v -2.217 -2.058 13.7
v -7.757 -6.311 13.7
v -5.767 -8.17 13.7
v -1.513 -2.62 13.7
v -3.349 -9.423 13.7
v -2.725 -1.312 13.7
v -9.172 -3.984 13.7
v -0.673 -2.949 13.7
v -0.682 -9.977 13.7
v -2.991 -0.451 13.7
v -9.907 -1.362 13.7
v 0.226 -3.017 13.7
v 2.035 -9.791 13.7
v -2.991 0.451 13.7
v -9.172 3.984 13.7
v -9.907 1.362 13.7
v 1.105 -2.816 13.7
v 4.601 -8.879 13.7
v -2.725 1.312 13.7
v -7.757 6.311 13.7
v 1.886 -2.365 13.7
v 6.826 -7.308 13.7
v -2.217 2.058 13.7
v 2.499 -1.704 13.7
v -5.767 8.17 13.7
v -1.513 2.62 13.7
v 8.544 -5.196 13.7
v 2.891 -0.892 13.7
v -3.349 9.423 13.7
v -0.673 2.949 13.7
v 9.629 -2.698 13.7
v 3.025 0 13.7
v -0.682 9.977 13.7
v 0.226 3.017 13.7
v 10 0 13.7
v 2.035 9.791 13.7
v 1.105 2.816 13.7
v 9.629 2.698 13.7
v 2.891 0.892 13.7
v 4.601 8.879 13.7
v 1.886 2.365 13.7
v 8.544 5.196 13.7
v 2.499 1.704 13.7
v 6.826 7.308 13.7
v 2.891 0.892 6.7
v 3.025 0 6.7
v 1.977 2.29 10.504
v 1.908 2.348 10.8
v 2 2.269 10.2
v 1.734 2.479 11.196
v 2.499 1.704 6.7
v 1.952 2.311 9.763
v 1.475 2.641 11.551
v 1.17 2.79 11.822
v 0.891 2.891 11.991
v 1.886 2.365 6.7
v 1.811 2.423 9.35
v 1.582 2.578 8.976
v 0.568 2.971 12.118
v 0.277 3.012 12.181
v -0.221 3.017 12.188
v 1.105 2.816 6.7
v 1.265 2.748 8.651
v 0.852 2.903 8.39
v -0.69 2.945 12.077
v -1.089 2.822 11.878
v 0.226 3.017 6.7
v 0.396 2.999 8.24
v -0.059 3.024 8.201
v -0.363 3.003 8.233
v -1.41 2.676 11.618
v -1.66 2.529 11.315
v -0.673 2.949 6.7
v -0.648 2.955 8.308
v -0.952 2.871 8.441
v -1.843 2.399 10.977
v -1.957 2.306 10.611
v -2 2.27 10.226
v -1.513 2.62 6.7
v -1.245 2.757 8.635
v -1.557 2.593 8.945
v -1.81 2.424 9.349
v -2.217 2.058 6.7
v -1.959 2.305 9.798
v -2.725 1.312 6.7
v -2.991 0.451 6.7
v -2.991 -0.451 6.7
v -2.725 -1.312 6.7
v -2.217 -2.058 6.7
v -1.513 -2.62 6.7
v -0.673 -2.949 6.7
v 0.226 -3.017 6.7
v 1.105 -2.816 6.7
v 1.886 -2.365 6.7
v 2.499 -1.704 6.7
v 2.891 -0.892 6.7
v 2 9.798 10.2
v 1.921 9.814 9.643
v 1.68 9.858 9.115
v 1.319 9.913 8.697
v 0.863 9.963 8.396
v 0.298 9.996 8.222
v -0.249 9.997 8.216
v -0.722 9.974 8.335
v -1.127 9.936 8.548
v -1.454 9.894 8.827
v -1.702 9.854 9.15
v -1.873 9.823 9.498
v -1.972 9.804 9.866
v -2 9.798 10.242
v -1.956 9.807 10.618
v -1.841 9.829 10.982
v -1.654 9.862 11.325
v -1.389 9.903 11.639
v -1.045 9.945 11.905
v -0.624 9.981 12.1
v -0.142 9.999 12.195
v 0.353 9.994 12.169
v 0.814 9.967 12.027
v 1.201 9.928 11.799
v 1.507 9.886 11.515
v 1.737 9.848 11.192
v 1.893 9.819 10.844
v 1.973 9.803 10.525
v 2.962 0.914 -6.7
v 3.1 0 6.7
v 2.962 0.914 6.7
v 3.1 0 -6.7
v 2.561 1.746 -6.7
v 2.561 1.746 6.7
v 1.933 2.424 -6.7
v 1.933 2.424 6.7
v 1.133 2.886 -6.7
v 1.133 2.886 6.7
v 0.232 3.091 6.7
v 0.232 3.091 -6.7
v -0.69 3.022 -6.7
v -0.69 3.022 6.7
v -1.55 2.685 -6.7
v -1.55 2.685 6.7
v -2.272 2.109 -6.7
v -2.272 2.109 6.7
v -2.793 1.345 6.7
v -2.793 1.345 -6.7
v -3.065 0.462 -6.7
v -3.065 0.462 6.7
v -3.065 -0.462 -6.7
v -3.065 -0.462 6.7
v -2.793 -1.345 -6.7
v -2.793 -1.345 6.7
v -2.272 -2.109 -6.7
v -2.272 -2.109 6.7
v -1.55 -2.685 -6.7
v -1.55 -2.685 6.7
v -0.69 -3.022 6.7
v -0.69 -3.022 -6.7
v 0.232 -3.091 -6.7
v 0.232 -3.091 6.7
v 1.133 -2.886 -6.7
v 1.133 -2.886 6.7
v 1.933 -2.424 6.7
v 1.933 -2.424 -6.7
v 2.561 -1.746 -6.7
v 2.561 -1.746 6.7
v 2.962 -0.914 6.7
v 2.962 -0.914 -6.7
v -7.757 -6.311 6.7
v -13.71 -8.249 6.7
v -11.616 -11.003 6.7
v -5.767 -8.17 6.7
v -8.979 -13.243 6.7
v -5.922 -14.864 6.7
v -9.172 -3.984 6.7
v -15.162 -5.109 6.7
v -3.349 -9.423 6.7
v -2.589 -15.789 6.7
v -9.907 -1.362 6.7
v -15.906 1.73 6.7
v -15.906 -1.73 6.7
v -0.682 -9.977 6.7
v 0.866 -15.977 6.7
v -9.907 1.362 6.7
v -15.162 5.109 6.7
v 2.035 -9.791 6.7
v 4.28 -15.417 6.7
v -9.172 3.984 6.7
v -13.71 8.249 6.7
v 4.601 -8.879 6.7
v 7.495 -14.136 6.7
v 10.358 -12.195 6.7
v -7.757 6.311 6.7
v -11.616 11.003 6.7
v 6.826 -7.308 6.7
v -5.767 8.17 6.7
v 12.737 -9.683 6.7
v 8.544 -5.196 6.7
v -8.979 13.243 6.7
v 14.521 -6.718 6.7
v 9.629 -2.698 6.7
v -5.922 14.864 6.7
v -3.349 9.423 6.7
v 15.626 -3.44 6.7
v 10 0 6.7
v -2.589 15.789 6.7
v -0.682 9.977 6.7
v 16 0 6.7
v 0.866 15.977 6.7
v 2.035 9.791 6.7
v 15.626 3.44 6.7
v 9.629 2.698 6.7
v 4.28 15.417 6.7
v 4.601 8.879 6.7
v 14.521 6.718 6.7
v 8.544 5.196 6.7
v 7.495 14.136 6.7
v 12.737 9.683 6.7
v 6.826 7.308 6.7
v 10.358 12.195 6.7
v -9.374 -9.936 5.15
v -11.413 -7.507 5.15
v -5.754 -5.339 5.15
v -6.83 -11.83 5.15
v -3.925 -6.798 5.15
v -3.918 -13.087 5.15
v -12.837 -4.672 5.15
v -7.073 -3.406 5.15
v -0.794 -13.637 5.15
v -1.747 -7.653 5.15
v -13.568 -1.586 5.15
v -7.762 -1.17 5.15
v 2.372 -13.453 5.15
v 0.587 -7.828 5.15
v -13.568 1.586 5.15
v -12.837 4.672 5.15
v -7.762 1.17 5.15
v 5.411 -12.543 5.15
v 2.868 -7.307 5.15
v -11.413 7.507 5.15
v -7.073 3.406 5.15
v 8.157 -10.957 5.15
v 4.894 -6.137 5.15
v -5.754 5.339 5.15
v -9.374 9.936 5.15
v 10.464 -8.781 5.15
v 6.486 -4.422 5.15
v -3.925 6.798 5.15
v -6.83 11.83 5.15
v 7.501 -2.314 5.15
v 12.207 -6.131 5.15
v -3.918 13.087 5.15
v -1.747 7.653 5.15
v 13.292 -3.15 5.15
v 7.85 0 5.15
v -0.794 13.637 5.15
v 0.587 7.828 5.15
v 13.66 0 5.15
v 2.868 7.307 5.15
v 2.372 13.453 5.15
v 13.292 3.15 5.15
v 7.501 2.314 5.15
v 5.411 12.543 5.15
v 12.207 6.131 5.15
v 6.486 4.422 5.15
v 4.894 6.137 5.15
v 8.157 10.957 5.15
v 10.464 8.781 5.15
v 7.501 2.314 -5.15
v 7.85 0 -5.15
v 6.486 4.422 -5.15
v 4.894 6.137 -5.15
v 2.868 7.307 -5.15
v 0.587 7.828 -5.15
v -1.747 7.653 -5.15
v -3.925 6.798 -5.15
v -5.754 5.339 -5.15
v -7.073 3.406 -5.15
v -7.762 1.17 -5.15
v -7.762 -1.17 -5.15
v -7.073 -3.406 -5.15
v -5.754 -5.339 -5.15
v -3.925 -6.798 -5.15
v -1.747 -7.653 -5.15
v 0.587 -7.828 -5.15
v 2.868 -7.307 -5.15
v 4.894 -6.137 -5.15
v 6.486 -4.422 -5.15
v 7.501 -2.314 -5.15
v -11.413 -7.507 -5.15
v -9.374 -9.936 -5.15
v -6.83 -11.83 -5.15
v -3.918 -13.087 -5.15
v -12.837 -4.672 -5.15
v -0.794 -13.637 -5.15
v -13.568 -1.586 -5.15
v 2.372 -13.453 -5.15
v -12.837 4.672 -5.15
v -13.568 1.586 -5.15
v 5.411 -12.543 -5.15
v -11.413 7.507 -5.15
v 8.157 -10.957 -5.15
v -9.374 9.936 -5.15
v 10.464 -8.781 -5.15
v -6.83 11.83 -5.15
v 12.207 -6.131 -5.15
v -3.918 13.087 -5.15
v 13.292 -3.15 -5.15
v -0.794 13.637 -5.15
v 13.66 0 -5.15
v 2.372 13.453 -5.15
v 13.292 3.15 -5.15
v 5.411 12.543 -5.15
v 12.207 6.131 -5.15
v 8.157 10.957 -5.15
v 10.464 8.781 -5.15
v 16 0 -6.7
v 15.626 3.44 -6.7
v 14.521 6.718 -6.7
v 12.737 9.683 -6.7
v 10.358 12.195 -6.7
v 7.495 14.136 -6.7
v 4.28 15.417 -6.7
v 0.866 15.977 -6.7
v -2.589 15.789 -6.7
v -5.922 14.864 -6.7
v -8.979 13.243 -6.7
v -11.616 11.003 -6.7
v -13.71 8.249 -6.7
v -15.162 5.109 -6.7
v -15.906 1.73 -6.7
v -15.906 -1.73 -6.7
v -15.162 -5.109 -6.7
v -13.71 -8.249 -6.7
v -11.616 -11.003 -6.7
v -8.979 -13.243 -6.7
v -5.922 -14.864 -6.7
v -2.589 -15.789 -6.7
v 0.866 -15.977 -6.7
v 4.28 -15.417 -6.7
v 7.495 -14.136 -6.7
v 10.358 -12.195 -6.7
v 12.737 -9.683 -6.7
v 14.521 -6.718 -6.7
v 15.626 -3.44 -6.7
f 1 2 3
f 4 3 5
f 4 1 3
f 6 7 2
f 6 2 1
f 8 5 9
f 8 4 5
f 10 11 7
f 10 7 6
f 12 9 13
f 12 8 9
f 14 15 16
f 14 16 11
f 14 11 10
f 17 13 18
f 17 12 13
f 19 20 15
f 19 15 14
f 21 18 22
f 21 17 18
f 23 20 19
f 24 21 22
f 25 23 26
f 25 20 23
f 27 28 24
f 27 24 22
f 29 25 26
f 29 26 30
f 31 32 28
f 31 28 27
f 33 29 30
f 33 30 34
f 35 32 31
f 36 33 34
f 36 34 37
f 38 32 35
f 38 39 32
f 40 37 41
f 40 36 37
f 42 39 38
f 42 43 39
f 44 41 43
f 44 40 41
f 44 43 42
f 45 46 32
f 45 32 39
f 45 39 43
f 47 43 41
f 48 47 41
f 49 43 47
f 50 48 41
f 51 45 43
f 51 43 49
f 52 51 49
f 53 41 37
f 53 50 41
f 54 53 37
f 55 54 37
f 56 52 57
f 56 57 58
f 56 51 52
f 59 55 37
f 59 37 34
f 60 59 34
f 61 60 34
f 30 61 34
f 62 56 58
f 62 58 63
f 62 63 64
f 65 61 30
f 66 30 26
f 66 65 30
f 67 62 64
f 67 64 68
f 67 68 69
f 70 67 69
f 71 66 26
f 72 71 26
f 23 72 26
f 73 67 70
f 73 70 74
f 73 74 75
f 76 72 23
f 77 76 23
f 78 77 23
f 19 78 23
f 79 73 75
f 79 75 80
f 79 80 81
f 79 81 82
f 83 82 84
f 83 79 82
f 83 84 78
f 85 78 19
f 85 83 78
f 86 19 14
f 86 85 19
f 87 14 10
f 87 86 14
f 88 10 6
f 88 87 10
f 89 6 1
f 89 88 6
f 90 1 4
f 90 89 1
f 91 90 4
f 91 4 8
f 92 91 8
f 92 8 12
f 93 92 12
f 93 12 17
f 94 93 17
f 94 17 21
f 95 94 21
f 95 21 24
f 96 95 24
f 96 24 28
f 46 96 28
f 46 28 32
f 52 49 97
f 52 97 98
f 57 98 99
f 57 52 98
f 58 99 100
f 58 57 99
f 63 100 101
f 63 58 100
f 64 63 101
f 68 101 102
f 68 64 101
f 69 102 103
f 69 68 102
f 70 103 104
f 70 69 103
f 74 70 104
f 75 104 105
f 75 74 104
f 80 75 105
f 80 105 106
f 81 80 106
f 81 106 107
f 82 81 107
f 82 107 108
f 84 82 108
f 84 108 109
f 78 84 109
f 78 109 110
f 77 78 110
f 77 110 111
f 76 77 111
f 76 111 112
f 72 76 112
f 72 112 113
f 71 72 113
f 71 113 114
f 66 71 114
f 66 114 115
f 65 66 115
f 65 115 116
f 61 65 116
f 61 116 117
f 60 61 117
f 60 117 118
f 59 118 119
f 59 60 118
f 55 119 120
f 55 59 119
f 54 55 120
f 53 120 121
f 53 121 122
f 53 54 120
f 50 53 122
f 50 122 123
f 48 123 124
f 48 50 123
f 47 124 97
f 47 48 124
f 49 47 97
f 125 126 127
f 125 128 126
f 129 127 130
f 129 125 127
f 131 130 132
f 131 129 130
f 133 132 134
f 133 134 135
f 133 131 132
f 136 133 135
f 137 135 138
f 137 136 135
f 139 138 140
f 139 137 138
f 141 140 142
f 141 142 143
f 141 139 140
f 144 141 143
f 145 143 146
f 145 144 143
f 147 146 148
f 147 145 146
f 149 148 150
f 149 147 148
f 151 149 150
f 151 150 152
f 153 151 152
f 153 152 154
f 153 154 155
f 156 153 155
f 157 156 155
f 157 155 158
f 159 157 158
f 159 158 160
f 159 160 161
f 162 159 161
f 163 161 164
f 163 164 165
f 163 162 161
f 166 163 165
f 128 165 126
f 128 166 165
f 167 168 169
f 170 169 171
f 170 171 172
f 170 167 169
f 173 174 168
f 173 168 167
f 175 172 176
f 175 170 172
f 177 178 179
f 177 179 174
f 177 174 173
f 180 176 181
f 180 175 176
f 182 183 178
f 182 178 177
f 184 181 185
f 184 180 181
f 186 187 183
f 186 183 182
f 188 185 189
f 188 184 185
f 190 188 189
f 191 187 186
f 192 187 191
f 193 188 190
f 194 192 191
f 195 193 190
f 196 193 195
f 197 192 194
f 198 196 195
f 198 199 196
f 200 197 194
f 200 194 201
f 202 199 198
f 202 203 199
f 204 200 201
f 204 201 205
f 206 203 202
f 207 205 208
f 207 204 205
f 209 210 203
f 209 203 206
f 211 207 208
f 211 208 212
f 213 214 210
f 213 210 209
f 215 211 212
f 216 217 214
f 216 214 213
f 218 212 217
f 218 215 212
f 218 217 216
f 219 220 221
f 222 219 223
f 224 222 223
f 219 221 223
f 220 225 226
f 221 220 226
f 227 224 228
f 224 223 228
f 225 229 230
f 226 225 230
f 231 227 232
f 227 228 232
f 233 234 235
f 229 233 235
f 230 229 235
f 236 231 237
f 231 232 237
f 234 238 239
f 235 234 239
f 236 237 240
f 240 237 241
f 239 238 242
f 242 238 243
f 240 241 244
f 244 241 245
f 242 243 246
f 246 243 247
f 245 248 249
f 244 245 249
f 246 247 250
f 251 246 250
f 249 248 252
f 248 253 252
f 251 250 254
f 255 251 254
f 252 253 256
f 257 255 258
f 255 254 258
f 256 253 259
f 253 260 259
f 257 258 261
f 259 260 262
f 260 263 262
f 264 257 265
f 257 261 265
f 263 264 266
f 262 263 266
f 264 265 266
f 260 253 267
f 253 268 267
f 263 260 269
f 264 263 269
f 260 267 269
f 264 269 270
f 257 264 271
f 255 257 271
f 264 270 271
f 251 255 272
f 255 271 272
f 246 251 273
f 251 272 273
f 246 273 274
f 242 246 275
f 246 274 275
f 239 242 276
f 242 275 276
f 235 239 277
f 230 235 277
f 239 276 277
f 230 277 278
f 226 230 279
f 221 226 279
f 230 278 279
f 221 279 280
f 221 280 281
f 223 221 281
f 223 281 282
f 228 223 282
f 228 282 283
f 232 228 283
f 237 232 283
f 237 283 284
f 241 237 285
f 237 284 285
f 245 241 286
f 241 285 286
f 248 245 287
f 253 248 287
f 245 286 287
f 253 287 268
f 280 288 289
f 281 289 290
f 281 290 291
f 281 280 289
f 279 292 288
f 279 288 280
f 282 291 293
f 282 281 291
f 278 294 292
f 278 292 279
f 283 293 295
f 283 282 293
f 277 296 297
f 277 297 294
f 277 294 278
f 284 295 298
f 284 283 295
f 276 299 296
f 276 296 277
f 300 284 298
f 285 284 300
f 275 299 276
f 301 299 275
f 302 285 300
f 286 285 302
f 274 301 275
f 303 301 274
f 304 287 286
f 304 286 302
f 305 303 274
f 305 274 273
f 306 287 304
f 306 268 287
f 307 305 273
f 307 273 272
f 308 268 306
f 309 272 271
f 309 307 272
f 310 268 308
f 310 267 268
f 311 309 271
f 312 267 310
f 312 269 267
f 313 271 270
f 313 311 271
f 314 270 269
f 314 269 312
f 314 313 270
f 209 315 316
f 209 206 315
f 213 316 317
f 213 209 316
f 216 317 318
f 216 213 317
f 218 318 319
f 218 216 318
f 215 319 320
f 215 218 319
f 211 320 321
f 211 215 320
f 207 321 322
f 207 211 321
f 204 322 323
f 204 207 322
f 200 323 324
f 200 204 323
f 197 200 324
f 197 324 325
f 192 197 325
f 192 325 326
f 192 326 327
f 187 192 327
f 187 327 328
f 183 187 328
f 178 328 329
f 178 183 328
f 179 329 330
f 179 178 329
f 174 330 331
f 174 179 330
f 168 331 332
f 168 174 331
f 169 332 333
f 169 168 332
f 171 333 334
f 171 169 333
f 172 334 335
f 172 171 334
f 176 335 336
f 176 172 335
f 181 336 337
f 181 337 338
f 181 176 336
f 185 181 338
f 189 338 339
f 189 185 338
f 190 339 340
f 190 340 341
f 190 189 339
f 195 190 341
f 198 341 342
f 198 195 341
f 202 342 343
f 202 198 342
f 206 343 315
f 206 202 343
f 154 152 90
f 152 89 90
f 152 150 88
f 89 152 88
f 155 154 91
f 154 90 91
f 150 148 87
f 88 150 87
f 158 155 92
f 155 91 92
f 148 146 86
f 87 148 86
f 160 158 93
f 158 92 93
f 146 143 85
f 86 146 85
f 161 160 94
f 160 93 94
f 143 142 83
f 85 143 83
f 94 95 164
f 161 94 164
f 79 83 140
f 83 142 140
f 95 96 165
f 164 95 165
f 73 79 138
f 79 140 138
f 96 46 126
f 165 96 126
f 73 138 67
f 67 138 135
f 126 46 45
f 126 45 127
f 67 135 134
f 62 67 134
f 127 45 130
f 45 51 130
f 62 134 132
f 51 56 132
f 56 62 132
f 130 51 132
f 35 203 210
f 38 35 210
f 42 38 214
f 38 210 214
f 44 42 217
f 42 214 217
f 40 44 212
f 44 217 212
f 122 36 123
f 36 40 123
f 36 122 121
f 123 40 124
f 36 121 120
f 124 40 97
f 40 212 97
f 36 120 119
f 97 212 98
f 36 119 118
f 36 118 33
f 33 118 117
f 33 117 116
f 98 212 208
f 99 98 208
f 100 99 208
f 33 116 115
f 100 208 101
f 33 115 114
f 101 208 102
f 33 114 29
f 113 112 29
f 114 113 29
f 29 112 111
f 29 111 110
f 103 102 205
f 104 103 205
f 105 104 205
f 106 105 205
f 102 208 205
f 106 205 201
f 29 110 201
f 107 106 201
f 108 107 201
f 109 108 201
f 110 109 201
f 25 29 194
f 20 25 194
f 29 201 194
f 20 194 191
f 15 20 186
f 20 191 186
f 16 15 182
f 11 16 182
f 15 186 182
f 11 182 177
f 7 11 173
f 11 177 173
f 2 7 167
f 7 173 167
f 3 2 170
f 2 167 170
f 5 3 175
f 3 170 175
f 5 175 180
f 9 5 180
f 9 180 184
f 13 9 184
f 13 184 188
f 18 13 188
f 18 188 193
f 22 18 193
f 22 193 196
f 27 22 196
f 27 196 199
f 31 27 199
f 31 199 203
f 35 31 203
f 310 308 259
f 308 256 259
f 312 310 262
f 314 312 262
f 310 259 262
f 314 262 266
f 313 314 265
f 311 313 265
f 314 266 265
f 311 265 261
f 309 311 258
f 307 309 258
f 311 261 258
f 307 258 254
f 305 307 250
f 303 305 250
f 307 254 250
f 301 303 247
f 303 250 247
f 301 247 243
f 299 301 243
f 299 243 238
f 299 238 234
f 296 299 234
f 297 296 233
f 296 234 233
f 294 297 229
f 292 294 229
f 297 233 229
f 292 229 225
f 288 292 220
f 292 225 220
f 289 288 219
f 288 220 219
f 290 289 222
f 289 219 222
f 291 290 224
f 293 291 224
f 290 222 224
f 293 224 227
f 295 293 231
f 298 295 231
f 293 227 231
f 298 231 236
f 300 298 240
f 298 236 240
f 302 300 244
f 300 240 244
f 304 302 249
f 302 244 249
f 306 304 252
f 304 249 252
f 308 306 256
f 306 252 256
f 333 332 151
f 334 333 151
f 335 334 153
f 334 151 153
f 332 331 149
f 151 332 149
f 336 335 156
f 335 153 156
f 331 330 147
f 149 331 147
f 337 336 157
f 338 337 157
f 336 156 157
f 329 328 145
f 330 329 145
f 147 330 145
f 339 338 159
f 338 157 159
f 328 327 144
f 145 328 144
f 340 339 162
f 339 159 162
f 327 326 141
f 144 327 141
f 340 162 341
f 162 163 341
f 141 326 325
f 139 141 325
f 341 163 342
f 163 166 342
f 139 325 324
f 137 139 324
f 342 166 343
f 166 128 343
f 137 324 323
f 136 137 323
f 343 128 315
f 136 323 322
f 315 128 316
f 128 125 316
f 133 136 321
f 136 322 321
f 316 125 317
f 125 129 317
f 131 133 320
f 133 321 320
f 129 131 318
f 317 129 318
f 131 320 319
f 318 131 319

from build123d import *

# Parameters (mm, degrees)
ESQUISSE1_R             = 16
ESQUISSE1_R_2           = 3.1
BOSS_EXTRU_1_DEPTH      = 6.7
ESQUISSE2_R             = 13.660407535
ESQUISSE2_R_2           = 7.85
ENL_V_MAT_EXTRU_1_DEPTH = 5.15
ESQUISSE4_R             = 10
ESQUISSE4_R_2           = 3.025
BOSS_EXTRU_2_DEPTH      = 7
ESQUISSE5_R             = 2
ENL_V_MAT_EXTRU_3_DEPTH = 17


with BuildPart() as part:
    # Esquisse1 → Boss.-Extru.1 (new body, symmetric)
    with BuildSketch(Plane.XY):
        Circle(ESQUISSE1_R)
        Circle(ESQUISSE1_R_2, mode=Mode.SUBTRACT)
    extrude(amount=BOSS_EXTRU_1_DEPTH, both=True)

    # Esquisse2 → Enlèv. mat.-Extru.1 (cut, symmetric)
    with BuildSketch(Plane.XY):
        Circle(ESQUISSE2_R)
        Circle(ESQUISSE2_R_2, mode=Mode.SUBTRACT)
    extrude(amount=ENL_V_MAT_EXTRU_1_DEPTH, both=True, mode=Mode.SUBTRACT)

    # Esquisse4 → Boss.-Extru.2 (add)
    with BuildSketch(Plane.XY.offset(6.7)):
        Circle(ESQUISSE4_R)
        Circle(ESQUISSE4_R_2, mode=Mode.SUBTRACT)
    extrude(amount=BOSS_EXTRU_2_DEPTH)

    # Esquisse5 → Enlèv. mat.-Extru.3 (cut, through all)
    with BuildSketch(Plane(origin=(0, 0, 0), x_dir=(1, 0, 0), z_dir=(0, 1, 0))):
        with Locations((0, -10.2)):
            Circle(ESQUISSE5_R)
    extrude(amount=ENL_V_MAT_EXTRU_3_DEPTH, mode=Mode.SUBTRACT)


solid = part.part
